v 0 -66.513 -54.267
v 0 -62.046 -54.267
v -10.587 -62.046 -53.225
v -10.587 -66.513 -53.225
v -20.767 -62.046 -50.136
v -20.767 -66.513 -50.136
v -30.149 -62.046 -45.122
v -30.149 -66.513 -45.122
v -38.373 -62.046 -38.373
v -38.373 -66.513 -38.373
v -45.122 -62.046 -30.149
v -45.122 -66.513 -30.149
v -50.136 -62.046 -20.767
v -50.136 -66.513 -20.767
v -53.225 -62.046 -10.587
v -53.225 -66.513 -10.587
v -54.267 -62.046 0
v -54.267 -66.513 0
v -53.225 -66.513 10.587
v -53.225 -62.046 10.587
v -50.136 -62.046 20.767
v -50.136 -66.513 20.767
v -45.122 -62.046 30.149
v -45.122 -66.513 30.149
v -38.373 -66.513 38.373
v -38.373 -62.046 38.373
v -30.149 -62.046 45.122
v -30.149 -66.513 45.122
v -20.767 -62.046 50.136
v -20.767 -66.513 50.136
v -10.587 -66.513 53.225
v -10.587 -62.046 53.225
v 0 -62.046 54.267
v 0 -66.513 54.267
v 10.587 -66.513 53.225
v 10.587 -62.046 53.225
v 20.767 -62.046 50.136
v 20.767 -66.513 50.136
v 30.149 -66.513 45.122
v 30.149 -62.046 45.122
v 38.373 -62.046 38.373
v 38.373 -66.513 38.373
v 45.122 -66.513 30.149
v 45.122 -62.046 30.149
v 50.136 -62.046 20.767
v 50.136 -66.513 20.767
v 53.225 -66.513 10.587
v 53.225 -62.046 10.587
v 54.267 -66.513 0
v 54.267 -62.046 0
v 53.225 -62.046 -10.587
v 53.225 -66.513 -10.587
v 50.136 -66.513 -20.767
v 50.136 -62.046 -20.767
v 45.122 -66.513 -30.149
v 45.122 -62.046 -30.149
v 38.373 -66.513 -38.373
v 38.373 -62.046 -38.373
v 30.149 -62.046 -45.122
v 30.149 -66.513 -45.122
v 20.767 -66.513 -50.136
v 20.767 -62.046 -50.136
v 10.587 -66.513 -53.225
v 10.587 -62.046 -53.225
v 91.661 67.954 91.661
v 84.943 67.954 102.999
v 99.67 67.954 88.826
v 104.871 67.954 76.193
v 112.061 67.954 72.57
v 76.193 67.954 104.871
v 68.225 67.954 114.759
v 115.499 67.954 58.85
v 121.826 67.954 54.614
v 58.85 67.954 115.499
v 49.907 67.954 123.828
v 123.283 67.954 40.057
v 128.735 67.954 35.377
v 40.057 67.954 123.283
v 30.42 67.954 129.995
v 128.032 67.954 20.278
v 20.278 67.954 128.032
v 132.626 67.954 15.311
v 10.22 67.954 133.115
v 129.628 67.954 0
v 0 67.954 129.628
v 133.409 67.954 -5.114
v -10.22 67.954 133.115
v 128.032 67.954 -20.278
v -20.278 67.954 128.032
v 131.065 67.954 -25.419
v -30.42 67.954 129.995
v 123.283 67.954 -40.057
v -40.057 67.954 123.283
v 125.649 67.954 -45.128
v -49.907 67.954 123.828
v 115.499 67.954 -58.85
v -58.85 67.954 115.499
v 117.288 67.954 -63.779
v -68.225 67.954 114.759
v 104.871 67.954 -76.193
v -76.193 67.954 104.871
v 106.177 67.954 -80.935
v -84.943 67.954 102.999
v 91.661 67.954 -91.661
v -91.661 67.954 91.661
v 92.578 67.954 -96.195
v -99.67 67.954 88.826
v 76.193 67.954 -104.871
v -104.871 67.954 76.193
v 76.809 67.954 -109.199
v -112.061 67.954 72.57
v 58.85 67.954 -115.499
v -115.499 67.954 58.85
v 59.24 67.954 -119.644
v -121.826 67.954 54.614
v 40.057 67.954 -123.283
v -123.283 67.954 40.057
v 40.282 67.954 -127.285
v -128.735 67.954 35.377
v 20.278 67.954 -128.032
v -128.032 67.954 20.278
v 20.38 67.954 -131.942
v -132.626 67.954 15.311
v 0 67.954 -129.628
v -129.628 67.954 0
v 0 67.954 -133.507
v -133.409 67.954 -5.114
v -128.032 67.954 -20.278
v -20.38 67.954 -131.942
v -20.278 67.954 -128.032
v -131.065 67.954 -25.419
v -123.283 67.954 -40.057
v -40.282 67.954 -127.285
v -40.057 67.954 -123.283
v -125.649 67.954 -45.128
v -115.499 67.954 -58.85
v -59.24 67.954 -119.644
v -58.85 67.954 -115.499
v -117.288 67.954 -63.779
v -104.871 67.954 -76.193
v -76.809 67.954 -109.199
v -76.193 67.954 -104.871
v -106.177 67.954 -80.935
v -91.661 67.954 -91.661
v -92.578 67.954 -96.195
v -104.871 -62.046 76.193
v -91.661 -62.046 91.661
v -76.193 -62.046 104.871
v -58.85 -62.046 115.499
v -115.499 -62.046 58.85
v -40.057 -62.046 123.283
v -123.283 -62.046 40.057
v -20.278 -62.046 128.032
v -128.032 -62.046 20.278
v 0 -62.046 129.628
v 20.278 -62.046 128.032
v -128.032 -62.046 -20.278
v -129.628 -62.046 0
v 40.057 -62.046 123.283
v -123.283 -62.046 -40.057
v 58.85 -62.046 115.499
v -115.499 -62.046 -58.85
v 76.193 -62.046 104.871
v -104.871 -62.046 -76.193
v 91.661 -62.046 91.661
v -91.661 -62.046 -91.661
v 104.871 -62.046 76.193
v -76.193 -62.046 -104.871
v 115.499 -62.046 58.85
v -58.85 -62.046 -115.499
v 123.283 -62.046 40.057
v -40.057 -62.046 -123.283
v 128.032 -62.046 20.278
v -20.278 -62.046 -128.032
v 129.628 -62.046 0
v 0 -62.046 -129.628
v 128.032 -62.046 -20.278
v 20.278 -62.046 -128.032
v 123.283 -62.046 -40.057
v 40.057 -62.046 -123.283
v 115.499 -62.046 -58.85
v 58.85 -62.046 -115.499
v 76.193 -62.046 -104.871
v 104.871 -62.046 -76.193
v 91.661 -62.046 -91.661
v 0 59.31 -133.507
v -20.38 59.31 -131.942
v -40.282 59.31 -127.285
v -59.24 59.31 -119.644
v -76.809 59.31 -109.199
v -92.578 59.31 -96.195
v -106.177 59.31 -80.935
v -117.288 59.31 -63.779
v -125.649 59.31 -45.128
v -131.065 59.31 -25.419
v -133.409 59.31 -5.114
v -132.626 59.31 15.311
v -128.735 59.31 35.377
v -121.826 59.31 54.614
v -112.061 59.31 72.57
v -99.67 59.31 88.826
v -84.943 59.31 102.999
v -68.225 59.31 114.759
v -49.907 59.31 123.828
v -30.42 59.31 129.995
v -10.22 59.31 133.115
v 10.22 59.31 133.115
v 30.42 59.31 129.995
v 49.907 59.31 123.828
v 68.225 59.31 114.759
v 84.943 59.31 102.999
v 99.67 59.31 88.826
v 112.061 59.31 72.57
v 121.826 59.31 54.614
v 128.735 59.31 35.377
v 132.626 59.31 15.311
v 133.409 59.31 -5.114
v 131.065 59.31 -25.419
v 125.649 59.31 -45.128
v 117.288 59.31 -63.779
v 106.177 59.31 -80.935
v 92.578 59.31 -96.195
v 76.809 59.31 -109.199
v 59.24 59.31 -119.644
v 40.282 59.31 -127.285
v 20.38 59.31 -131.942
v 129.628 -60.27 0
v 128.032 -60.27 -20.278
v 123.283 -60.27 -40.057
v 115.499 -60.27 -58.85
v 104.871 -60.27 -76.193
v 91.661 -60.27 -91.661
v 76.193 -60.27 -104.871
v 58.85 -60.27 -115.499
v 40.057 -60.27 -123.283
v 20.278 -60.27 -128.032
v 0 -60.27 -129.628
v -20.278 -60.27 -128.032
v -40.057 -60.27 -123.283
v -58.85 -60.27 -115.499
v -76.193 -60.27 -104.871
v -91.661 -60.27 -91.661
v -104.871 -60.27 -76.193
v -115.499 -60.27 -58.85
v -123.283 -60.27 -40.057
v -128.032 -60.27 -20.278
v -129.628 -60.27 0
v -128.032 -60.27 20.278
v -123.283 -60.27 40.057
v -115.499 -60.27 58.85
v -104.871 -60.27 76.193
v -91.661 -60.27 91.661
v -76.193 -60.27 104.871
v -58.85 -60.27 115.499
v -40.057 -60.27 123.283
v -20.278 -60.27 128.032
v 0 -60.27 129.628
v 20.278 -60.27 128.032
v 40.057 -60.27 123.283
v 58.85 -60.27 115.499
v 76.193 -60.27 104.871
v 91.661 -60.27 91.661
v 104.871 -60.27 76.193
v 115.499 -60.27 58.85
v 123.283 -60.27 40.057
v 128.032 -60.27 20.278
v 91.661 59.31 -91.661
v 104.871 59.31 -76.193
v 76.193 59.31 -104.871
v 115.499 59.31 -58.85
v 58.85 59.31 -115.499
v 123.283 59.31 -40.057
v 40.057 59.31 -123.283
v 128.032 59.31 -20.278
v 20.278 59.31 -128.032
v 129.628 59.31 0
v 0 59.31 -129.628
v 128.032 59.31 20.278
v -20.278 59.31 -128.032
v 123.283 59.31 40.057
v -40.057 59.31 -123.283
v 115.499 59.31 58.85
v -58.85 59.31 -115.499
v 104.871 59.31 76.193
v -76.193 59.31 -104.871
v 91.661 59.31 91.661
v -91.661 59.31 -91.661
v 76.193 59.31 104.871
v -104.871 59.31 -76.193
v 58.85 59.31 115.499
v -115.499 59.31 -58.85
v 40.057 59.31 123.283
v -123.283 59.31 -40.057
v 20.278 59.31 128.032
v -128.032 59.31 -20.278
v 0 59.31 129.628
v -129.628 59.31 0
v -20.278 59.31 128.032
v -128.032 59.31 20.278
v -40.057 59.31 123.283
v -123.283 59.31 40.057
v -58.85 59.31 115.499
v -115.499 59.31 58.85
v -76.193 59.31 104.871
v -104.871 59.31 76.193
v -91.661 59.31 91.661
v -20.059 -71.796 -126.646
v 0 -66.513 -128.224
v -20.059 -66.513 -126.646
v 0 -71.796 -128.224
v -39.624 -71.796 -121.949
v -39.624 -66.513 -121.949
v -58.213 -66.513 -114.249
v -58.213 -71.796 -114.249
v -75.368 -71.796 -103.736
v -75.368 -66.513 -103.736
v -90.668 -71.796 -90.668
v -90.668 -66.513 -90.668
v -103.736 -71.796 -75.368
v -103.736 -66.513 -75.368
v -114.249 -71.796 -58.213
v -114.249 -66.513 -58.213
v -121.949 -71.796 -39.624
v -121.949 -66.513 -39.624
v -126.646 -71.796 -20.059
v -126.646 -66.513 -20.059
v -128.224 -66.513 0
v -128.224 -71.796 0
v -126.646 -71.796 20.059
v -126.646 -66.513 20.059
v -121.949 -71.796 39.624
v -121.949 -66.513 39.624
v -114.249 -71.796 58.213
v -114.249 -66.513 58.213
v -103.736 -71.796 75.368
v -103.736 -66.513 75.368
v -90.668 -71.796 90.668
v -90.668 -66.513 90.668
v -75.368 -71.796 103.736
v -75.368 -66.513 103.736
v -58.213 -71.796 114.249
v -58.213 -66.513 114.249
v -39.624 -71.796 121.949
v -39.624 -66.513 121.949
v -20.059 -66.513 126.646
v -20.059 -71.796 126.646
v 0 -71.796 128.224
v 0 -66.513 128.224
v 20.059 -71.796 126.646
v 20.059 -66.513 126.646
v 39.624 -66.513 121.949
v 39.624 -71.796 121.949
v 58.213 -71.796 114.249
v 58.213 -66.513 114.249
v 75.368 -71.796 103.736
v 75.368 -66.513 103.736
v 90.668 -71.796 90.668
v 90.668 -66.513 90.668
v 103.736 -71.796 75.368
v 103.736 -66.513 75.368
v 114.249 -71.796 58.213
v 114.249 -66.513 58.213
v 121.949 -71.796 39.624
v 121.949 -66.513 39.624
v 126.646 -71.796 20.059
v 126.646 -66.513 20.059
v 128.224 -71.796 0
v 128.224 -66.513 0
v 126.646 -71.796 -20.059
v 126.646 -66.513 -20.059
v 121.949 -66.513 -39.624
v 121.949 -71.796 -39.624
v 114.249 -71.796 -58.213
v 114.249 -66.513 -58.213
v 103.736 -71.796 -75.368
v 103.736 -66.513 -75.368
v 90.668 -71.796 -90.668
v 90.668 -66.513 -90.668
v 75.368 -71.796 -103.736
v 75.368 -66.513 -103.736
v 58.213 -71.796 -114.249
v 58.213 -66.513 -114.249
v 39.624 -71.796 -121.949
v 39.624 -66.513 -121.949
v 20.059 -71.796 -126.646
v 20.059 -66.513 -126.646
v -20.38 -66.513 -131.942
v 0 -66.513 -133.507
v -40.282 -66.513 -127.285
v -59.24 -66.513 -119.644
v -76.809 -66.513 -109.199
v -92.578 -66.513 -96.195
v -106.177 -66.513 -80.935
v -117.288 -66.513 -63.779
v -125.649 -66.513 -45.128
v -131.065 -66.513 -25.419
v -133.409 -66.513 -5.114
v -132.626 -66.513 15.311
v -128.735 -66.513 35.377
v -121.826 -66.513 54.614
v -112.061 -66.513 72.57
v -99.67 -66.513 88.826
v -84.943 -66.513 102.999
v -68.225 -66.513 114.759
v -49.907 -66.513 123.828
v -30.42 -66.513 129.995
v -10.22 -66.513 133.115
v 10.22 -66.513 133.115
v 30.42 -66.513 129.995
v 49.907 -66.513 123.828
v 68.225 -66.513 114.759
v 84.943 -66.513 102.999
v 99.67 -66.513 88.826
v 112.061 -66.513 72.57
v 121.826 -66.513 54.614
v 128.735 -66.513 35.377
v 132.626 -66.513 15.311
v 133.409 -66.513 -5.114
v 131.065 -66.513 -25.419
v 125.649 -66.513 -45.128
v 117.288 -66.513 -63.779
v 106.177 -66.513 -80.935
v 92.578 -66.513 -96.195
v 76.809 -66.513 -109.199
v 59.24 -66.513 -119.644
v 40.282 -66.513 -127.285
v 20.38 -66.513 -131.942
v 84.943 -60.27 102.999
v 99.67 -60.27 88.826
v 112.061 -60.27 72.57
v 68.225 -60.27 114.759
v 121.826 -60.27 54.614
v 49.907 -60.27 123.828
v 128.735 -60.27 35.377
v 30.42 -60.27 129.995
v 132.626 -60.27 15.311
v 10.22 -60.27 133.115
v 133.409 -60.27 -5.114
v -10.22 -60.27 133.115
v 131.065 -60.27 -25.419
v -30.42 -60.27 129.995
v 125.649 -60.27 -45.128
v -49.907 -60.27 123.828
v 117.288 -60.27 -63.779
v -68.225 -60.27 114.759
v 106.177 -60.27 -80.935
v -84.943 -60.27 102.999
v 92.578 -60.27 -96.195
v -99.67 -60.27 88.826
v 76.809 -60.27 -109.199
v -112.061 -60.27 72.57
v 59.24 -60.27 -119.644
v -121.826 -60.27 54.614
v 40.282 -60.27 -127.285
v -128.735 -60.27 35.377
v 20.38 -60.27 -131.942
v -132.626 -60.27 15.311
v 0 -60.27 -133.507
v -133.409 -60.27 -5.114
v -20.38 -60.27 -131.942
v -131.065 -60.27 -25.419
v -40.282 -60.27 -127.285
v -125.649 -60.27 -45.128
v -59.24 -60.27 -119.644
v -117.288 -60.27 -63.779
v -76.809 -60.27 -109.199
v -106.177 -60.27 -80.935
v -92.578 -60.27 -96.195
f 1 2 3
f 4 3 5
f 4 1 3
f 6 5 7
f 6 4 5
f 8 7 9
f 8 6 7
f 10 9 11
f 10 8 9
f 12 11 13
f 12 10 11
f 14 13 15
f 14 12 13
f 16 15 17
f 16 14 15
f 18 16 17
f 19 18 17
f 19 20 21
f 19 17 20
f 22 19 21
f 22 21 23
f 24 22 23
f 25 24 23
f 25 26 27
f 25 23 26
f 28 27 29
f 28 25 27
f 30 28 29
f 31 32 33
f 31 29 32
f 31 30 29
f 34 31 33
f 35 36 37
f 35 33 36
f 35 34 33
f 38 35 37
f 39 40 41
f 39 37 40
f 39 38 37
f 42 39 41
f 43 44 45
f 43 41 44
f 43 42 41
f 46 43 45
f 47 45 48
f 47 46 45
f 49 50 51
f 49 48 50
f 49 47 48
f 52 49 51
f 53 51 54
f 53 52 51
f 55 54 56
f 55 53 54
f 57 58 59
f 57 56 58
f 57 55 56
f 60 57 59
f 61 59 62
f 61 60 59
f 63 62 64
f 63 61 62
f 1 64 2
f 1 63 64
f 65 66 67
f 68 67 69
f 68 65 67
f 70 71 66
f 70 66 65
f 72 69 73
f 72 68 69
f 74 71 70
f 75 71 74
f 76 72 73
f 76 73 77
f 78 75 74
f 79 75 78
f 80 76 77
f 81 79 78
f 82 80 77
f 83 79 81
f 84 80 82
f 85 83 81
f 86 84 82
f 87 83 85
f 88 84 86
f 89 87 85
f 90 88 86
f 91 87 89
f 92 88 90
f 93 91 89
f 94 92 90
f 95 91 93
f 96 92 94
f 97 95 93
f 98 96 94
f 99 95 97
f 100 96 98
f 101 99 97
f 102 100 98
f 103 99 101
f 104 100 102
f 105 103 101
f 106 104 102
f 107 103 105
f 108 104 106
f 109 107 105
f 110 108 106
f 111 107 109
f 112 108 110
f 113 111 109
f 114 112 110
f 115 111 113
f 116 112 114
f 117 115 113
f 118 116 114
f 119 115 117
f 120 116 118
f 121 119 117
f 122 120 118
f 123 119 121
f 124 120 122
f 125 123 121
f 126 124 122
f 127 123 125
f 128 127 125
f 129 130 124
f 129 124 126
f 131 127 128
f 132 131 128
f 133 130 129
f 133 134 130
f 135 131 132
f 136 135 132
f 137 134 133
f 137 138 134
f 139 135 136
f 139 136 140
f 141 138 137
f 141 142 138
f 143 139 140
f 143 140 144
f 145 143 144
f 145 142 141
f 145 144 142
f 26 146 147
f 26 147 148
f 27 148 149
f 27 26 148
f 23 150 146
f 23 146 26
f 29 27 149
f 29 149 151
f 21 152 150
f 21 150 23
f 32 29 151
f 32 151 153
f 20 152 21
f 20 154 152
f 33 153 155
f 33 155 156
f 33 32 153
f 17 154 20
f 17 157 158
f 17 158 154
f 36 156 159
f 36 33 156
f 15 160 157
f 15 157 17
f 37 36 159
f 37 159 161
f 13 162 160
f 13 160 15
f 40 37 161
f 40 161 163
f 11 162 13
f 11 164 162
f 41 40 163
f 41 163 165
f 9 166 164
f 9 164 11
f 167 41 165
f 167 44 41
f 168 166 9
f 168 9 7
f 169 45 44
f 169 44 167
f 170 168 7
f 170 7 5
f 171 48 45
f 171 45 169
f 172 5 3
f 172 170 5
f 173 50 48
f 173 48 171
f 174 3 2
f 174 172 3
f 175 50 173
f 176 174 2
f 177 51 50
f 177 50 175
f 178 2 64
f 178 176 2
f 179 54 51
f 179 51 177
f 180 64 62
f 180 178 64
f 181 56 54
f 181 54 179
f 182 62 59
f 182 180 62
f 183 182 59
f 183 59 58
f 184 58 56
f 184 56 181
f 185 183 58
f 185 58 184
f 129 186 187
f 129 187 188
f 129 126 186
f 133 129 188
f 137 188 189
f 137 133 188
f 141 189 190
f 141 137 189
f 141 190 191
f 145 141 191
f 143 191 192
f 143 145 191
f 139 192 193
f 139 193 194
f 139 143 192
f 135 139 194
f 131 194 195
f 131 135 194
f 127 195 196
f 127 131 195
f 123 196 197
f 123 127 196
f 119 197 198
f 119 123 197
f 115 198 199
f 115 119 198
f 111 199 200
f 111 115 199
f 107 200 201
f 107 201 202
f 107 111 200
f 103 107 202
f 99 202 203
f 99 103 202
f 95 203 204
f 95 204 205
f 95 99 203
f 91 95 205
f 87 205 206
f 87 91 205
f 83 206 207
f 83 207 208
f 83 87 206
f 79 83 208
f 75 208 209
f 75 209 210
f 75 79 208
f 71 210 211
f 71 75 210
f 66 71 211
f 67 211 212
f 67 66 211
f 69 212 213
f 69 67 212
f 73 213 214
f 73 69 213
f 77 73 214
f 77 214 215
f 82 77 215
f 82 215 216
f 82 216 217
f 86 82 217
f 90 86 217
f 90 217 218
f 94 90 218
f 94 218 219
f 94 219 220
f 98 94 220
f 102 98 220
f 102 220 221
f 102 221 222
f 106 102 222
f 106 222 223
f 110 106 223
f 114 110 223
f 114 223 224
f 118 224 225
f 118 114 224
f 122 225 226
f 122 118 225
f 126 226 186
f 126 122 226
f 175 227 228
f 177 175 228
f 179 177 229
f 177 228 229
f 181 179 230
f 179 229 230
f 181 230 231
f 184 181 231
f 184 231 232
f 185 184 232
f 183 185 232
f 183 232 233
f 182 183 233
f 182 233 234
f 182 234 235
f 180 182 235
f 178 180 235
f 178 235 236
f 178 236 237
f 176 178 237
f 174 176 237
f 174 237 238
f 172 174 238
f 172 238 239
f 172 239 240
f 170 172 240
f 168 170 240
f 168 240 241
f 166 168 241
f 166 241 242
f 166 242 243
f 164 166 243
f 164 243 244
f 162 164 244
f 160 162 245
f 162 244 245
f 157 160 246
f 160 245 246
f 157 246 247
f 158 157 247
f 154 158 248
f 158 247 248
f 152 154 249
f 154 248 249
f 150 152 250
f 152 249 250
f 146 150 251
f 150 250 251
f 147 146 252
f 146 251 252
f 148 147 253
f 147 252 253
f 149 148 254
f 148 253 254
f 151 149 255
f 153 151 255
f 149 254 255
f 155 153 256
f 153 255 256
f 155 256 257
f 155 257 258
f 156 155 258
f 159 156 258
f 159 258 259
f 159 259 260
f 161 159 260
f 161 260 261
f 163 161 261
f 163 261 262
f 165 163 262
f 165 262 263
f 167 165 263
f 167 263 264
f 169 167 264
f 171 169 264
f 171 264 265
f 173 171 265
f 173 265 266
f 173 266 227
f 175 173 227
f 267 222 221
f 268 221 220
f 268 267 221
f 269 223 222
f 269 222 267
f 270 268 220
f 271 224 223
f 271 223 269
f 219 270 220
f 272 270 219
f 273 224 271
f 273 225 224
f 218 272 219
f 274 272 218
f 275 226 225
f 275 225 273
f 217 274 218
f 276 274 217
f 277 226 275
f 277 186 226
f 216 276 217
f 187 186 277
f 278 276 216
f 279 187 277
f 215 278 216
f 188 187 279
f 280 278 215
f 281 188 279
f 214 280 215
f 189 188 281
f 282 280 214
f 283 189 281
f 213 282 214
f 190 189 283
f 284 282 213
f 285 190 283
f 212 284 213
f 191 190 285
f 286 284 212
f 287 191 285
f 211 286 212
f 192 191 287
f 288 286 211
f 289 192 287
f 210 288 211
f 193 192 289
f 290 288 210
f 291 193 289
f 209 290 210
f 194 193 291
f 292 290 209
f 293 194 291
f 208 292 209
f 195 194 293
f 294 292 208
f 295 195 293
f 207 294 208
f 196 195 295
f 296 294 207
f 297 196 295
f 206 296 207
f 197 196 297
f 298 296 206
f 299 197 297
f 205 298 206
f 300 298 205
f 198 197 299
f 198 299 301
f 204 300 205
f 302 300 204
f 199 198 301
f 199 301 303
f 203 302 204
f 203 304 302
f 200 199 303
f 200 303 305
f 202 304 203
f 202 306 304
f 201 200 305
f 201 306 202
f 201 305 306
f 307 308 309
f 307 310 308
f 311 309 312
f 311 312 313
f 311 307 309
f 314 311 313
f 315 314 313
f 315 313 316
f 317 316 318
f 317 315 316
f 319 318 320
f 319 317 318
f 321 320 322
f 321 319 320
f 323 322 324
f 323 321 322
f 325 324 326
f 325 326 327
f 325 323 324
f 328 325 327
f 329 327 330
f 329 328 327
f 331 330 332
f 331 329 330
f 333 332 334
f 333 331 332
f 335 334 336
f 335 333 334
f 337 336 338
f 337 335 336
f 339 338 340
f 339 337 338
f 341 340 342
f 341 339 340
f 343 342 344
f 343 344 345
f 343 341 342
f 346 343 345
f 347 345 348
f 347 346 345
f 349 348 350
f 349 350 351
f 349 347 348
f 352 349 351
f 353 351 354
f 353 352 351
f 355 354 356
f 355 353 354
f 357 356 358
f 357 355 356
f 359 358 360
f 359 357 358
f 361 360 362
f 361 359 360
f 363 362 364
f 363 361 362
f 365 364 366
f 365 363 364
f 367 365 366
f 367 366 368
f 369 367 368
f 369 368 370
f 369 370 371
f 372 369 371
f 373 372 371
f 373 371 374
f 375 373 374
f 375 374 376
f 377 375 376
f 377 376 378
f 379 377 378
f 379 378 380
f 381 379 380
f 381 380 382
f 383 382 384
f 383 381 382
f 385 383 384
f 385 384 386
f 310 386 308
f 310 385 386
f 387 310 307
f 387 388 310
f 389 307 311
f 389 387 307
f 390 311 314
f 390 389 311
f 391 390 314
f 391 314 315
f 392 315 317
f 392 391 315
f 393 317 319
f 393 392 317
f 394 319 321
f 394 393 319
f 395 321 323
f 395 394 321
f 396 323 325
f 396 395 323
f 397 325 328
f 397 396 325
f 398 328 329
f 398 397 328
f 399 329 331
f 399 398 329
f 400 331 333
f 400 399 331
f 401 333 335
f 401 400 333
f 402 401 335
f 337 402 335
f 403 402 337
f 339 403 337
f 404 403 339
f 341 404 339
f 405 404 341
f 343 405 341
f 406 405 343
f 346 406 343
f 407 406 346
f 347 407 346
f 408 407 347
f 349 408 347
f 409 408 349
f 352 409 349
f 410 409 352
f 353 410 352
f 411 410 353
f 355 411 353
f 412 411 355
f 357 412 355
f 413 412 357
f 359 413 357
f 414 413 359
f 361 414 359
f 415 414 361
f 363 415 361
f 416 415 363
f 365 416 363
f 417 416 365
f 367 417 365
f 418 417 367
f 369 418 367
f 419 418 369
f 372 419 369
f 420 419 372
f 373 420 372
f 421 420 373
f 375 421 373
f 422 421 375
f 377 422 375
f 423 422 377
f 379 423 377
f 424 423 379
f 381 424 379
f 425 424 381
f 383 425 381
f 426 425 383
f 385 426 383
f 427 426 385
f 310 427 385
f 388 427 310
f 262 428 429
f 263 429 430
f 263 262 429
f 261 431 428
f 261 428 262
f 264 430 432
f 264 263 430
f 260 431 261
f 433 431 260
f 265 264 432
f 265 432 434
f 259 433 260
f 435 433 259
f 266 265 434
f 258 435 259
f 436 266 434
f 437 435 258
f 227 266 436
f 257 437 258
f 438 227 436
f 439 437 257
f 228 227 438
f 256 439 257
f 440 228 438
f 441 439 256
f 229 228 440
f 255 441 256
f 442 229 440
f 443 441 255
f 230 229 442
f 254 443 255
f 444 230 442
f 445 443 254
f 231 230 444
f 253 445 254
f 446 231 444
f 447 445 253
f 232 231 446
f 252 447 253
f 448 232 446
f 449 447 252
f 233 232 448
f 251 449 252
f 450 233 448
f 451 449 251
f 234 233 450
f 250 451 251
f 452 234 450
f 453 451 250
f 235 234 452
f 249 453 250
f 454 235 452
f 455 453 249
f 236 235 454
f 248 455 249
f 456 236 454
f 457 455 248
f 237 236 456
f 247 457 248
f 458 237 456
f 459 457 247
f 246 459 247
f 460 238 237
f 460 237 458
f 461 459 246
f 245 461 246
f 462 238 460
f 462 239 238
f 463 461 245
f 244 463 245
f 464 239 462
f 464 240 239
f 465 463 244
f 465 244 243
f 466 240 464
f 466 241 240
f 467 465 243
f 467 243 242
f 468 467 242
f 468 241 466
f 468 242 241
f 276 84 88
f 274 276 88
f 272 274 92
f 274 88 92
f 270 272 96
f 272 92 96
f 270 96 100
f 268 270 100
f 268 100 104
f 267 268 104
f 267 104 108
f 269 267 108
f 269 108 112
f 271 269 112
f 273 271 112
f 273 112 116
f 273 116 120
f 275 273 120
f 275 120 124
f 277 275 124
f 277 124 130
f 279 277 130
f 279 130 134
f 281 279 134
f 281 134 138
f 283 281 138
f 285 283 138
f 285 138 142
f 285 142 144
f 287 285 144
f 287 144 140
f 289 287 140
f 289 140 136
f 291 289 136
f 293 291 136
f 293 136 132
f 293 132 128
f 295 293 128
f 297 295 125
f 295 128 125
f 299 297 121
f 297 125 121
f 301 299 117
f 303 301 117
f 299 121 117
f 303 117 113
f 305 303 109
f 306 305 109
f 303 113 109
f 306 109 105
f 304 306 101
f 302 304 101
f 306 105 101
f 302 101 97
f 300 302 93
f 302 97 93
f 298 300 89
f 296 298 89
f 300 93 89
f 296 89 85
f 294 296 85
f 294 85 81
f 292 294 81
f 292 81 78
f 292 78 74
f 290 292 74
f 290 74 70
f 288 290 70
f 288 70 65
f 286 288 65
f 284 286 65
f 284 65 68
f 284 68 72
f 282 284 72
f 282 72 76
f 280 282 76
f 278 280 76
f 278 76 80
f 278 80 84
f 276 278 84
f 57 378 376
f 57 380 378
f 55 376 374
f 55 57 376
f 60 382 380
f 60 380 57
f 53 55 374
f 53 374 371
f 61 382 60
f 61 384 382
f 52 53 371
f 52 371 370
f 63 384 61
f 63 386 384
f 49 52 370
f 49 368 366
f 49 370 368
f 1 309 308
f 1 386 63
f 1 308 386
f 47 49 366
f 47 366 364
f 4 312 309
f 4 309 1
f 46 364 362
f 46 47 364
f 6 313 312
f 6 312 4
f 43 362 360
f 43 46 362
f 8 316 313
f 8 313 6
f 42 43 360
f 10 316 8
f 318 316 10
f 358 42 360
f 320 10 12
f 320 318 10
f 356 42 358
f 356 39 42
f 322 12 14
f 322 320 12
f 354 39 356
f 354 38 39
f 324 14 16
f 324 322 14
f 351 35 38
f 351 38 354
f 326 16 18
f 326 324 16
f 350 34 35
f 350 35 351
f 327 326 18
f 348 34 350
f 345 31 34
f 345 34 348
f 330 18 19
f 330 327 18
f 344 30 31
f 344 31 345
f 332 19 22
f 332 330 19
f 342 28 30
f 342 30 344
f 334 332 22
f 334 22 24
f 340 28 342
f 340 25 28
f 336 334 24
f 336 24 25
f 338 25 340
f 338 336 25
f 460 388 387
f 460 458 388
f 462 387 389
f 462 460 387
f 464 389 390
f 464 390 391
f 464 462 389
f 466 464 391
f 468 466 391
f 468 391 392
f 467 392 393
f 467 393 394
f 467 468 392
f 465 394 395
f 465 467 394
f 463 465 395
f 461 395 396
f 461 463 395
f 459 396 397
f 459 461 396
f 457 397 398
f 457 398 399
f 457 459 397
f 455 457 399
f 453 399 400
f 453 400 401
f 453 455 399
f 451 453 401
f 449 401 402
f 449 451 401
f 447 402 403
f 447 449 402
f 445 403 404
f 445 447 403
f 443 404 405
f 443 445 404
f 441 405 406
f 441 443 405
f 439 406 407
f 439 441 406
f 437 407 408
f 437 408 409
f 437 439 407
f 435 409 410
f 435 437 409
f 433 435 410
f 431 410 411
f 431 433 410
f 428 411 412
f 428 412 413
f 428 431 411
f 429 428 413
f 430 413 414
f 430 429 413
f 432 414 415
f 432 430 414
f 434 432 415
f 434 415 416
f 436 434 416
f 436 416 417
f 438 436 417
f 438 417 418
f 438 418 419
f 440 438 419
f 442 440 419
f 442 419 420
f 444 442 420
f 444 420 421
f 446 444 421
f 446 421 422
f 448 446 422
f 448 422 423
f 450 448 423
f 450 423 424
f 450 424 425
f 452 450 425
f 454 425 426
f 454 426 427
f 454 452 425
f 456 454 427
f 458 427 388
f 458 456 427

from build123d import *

# Parameters (mm, degrees)
CROQUIS2_R            = 129.627860529
CORTAR_EXTRUIR1_DEPTH = 130


with BuildPart() as part:
    # Croquis1 → Revolución1 (revolve)
    with BuildSketch(Plane(origin=(0, 0, 0), x_dir=(0, 0, -1), z_dir=(1, 0, 0))):
        Polygon((54.267285515, 67.95416726), (54.267285515, -66.513442866), (128.224471084, -66.513442866), (128.224471084, -60.270303824), (128.224471084, 59.309820895), (133.507127196, 59.309820895), (133.507127196, 67.95416726), align=None)
        Polygon((128.224471084, -60.270303824), (128.224471084, -66.513442866), (128.224471084, -71.796098978), (133.507127196, -66.513442866), (133.507127196, -60.270303824), align=None)
    revolve(axis=Axis((0, -66.513442866, 0), (0, 1, 0)))

    # Croquis2 → Cortar-Extruir1 (cut)
    with BuildSketch(Plane(origin=(0, 67.95416726, 0), x_dir=(1, 0, 0), z_dir=(0, 1, 0))):
        Circle(CROQUIS2_R)
    extrude(amount=-CORTAR_EXTRUIR1_DEPTH, mode=Mode.SUBTRACT)


solid = part.part
